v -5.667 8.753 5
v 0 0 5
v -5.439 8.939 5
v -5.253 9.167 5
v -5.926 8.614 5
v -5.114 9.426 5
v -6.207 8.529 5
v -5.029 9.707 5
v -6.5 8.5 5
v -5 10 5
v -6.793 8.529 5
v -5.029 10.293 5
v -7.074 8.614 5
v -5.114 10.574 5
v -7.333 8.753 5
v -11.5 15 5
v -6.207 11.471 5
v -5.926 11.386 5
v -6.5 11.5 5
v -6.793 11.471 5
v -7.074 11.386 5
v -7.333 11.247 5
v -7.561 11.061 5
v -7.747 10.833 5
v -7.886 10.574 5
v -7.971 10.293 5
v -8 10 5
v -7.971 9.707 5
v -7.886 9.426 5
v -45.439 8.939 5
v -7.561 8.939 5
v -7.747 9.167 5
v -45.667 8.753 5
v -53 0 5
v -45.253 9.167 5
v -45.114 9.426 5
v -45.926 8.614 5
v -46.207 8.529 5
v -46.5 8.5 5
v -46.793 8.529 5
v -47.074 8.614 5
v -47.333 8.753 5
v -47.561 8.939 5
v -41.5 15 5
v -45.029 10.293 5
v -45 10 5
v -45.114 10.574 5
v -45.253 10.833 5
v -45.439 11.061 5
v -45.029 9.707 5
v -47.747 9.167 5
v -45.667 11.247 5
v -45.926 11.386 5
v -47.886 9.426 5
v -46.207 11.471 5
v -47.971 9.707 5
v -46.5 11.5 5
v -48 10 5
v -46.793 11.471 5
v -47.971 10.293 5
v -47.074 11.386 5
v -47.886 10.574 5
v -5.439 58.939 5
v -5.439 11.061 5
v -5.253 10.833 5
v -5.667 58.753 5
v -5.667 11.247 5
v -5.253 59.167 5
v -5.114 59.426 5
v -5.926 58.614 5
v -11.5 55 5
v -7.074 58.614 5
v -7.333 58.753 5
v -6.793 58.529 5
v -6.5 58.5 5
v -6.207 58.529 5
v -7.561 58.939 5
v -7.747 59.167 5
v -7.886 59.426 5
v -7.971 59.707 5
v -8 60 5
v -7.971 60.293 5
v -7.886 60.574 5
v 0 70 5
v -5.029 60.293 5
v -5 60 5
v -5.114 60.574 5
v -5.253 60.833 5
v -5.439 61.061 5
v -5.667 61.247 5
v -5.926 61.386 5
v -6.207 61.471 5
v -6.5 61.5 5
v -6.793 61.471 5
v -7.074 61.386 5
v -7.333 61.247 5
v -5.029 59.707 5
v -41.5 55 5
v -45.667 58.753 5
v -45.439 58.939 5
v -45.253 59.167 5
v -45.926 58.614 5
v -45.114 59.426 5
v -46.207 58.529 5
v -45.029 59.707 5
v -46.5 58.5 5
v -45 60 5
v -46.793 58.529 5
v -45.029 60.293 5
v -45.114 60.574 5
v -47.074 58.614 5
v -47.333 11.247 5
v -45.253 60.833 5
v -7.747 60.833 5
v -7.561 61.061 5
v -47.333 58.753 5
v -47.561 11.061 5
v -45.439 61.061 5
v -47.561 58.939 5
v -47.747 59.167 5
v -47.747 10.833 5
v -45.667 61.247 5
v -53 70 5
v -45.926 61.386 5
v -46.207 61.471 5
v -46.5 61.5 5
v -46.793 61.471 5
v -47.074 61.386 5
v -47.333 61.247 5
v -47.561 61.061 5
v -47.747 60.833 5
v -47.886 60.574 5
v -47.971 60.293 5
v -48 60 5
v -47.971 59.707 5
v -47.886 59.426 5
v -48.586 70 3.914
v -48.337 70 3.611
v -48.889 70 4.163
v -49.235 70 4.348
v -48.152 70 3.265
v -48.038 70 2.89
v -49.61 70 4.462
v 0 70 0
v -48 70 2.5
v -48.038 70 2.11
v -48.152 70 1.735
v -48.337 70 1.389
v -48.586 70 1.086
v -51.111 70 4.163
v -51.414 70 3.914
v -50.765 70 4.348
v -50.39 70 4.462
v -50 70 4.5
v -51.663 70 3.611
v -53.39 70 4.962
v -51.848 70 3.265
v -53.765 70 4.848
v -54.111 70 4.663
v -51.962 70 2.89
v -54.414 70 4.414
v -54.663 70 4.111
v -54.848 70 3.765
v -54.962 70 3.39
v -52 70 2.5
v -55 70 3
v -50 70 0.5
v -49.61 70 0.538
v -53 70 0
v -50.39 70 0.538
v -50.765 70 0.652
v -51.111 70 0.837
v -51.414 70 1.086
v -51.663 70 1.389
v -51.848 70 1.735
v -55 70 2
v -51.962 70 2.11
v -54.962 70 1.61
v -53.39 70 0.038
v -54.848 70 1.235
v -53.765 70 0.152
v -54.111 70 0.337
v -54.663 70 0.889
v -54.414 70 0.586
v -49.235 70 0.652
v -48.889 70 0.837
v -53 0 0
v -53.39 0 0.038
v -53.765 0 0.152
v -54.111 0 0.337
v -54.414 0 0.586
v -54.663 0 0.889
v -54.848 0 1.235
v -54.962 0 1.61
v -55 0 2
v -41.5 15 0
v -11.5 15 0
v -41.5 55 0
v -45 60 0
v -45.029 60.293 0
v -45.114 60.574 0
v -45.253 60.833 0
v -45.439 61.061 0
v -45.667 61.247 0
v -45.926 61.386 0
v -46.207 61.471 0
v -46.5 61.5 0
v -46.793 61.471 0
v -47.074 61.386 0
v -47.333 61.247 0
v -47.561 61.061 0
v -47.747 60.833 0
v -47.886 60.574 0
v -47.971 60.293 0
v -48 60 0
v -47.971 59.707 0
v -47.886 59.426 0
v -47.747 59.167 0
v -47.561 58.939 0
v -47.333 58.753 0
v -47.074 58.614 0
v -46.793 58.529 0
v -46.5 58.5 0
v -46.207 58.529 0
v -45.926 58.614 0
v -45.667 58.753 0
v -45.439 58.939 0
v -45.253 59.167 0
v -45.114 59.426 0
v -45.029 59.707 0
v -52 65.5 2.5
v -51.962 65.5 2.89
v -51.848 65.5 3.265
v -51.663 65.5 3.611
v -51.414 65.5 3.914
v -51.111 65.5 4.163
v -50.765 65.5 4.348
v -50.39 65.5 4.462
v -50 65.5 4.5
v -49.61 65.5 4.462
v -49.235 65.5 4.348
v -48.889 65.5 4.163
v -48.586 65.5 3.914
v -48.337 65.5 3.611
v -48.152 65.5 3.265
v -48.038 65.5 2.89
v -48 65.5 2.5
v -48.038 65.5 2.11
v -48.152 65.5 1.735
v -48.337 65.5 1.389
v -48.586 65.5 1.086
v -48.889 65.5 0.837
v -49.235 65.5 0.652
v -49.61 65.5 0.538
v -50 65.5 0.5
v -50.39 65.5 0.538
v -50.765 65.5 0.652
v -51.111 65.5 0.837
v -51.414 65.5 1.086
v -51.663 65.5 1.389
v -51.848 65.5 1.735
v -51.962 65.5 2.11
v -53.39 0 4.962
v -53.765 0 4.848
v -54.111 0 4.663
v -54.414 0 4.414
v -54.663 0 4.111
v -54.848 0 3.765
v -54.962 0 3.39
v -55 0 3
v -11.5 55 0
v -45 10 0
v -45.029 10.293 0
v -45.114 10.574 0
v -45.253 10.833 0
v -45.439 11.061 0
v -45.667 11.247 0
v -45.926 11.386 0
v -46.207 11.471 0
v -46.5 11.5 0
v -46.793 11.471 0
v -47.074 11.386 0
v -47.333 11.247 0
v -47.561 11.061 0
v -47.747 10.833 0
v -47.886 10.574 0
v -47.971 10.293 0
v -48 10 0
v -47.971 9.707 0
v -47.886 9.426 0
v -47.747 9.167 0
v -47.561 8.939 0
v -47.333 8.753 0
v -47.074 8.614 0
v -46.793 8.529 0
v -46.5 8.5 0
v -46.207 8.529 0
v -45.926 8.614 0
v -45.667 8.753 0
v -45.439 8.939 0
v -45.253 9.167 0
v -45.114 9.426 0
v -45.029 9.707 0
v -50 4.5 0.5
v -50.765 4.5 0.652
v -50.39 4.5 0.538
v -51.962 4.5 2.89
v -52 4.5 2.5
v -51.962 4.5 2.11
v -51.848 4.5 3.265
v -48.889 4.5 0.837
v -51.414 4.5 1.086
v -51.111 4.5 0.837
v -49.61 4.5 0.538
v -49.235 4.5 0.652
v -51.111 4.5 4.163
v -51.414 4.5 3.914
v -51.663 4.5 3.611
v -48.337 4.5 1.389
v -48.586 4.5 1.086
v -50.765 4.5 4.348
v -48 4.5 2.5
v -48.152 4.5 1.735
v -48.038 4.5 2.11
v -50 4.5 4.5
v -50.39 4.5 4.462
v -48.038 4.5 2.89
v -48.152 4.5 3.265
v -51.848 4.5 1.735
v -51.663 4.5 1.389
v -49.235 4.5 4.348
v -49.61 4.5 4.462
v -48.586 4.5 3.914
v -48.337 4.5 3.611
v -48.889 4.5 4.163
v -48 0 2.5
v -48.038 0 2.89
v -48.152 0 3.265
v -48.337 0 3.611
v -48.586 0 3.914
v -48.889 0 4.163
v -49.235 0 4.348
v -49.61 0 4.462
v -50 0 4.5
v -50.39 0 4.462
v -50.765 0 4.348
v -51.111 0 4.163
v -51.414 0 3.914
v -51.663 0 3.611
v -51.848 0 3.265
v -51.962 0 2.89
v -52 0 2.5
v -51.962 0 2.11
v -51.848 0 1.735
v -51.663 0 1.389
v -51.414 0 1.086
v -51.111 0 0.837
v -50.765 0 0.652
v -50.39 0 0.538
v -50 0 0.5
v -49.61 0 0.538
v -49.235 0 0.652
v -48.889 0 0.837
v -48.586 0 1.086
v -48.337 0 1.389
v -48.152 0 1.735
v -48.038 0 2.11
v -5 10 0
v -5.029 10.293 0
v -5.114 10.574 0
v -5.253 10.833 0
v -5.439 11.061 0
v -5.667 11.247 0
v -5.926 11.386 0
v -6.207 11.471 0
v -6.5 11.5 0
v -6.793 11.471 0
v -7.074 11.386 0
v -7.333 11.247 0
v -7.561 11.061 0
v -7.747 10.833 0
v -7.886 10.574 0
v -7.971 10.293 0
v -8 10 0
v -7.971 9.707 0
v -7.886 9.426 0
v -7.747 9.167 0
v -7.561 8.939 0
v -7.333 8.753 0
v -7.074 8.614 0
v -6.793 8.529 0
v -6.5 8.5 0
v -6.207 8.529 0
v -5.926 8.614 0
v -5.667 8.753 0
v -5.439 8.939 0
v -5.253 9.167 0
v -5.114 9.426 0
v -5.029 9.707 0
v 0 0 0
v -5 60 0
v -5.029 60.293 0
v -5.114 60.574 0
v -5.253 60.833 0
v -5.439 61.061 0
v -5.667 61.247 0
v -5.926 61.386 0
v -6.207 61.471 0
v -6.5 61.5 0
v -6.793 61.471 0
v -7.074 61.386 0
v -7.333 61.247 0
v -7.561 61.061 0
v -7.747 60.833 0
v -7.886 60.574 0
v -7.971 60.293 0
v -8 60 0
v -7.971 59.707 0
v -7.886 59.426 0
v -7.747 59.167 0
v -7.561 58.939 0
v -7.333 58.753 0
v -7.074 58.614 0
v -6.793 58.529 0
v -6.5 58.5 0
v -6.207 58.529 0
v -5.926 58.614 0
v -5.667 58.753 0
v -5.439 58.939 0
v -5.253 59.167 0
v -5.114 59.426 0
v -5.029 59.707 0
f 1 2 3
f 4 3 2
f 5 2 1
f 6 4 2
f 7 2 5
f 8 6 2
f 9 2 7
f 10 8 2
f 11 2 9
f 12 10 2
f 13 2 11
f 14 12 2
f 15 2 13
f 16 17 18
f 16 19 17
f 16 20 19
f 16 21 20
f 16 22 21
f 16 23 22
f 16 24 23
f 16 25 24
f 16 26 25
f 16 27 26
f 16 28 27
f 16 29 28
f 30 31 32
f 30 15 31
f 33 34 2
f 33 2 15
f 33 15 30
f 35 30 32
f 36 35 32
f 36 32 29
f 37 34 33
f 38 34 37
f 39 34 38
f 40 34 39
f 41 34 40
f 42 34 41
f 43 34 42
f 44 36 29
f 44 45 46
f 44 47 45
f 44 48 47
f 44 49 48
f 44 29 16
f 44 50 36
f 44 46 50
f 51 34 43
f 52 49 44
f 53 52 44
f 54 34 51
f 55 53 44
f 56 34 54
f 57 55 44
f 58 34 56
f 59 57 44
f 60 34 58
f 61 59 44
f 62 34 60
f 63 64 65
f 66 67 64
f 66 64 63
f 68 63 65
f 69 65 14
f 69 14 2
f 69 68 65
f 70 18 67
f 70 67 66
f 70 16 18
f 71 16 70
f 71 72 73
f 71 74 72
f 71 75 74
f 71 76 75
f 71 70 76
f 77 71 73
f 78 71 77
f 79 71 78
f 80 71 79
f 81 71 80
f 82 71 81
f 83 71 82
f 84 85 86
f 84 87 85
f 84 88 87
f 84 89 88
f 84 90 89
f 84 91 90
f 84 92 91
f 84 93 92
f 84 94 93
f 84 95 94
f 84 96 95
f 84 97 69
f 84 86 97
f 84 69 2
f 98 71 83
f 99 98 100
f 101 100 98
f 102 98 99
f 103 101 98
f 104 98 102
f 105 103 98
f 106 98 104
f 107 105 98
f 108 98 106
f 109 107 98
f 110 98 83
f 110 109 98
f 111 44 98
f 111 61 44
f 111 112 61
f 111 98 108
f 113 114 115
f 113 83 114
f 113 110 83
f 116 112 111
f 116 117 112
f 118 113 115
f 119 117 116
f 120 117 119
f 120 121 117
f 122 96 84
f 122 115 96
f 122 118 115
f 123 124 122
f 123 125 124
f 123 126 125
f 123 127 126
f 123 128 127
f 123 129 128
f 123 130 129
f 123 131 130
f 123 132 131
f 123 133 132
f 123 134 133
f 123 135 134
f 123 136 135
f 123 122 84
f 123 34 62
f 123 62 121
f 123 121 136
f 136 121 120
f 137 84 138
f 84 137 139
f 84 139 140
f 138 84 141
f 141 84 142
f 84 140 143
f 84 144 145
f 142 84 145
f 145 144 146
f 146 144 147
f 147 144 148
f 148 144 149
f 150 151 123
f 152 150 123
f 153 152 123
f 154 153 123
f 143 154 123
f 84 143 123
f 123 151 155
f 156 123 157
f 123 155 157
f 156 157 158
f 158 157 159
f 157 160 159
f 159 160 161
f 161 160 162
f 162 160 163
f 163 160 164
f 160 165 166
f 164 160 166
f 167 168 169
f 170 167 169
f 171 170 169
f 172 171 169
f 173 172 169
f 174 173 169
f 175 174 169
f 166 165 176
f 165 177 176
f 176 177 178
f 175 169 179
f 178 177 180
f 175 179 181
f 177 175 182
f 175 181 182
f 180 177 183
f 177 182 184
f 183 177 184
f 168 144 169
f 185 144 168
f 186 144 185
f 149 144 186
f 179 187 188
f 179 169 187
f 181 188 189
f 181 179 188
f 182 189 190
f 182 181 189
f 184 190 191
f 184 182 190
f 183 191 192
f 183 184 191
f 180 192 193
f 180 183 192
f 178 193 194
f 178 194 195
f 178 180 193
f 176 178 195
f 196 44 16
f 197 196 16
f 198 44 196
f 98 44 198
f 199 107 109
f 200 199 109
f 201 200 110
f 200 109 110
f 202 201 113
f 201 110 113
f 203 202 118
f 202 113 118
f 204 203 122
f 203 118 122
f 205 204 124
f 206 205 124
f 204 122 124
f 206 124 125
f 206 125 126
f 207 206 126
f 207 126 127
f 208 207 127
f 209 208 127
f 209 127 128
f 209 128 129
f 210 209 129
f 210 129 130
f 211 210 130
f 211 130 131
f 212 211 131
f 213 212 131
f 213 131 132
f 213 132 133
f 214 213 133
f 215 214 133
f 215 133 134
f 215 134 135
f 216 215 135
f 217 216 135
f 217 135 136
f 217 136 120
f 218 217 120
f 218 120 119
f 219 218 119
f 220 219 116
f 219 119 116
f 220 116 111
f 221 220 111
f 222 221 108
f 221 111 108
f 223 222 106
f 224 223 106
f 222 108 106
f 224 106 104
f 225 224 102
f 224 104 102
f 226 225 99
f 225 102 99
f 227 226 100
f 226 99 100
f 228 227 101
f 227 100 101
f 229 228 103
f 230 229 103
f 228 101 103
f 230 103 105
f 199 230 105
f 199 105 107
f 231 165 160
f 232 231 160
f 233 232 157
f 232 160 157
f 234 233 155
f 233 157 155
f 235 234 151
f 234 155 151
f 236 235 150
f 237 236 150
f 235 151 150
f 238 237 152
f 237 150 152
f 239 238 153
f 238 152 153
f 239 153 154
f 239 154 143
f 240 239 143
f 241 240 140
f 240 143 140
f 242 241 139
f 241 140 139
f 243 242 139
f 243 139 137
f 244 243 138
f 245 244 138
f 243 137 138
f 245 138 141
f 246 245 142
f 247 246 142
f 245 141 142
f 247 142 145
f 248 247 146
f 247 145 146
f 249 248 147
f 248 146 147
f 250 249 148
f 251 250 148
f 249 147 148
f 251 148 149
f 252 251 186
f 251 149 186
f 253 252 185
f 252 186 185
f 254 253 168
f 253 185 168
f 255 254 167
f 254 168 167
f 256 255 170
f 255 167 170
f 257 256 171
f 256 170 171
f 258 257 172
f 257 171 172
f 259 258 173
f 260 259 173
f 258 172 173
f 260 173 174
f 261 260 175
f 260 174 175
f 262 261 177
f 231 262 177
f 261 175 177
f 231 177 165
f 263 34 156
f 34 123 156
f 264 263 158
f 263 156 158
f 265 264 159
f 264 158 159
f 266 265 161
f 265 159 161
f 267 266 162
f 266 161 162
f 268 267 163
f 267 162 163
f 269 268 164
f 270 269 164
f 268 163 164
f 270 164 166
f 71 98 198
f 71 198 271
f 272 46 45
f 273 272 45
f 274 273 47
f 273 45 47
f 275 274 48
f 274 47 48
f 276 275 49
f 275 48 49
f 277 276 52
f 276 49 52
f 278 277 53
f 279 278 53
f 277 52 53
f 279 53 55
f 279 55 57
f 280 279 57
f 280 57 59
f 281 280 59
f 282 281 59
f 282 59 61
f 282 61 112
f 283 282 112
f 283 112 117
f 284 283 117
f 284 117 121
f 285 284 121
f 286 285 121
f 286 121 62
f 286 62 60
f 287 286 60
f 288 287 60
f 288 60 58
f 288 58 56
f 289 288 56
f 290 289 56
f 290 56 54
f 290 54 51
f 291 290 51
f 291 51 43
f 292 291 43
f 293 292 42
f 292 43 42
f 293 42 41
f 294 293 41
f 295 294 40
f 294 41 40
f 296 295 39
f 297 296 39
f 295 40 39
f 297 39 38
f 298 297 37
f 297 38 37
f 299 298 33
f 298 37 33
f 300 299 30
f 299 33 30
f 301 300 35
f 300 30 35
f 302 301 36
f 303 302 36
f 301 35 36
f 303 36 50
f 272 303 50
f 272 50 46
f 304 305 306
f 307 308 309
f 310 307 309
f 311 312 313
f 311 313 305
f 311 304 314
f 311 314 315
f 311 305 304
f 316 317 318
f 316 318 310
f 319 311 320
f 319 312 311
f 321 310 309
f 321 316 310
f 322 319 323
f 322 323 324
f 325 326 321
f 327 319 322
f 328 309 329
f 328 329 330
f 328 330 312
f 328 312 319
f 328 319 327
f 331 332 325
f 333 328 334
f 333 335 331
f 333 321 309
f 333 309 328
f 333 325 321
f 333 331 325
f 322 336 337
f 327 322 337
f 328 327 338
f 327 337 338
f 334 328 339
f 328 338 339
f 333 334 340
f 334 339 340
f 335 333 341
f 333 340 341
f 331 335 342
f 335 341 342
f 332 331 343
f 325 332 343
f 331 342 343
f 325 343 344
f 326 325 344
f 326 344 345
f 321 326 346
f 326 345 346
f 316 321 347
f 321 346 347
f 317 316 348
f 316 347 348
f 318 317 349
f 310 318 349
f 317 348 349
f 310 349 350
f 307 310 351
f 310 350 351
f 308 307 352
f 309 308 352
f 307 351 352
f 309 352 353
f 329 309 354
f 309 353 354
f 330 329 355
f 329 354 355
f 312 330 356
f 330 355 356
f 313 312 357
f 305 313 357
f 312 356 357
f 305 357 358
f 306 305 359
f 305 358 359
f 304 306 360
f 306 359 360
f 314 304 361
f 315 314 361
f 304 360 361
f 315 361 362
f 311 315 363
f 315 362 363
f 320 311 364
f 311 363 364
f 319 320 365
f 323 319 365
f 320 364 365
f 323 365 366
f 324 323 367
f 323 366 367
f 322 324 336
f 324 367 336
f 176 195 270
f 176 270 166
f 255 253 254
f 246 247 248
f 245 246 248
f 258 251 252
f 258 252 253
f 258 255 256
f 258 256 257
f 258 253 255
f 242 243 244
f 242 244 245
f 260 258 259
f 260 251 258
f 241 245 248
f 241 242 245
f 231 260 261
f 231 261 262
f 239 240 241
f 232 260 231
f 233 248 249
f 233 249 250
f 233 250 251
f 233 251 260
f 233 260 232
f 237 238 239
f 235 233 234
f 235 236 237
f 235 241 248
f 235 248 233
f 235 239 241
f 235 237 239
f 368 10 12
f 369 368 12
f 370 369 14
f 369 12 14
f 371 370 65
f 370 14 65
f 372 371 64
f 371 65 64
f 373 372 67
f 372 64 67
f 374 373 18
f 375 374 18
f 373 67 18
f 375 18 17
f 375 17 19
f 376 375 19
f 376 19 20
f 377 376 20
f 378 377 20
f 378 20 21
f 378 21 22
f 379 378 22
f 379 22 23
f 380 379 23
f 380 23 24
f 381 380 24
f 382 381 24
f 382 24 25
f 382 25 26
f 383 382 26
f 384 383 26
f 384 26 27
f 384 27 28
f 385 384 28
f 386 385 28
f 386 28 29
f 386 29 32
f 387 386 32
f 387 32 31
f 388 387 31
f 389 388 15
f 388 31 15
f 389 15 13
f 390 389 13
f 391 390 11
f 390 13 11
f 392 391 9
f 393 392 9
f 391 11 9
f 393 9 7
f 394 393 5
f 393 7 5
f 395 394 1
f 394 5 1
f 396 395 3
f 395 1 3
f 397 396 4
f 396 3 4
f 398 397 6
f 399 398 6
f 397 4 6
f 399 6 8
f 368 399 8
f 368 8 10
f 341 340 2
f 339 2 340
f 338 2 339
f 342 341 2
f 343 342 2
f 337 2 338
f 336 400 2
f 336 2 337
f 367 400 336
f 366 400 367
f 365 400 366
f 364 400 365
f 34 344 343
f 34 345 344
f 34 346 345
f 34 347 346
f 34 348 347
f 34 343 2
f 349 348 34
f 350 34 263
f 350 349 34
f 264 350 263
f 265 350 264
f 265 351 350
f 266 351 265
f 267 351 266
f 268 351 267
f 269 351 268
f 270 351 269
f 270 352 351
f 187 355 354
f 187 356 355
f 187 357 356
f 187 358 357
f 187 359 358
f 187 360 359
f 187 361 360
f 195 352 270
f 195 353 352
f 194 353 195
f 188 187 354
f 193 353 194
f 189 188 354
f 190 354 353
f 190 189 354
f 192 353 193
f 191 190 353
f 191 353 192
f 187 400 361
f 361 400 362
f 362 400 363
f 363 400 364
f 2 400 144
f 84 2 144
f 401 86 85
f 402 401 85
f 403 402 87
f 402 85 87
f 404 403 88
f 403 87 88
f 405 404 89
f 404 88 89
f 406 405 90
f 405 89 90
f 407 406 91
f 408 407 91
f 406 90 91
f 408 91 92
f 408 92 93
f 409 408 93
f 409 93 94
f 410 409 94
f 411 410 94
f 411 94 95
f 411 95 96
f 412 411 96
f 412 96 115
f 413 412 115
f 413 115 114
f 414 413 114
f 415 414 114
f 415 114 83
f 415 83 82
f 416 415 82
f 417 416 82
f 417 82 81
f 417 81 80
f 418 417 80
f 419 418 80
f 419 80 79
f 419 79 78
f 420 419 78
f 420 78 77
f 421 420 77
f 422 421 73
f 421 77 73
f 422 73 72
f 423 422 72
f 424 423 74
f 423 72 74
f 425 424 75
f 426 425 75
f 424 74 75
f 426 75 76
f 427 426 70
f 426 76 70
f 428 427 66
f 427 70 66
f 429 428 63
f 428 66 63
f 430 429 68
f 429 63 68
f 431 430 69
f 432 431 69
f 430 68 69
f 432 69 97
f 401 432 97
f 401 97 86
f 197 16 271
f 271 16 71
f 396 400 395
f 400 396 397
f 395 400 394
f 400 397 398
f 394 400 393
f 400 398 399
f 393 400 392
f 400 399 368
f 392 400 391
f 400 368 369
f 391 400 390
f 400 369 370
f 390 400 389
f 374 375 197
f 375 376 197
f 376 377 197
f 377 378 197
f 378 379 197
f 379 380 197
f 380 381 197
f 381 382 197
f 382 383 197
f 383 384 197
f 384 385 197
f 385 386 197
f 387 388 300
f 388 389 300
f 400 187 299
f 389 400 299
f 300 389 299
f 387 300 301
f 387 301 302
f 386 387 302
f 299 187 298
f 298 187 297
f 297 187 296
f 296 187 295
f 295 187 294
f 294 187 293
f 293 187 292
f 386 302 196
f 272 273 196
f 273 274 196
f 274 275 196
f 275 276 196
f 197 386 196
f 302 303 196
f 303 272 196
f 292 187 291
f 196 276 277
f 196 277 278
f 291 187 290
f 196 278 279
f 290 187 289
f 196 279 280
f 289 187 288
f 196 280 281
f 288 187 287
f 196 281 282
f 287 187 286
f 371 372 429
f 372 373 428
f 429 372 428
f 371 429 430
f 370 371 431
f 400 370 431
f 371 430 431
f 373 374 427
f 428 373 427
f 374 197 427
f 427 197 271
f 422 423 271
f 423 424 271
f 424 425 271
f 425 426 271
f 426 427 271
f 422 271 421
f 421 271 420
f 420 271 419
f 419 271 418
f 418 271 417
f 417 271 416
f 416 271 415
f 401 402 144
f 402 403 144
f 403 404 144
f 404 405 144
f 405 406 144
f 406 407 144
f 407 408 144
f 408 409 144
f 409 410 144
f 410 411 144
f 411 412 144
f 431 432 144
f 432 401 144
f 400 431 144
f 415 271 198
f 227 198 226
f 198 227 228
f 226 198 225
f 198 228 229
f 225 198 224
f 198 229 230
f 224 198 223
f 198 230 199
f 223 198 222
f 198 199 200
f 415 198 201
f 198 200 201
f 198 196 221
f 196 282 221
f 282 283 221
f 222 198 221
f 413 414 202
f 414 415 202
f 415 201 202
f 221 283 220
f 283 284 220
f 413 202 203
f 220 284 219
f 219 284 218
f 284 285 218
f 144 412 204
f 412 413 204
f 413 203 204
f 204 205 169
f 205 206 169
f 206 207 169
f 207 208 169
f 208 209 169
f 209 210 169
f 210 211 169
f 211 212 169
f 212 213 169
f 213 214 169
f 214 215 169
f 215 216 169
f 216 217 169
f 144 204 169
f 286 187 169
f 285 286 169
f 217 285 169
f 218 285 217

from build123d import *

# Parameters (mm, degrees)
SKETCH1_W           = 70
SKETCH1_H           = 55
BOSS_EXTRUDE1_DEPTH = 5
SKETCH2_R           = 2
CUT_EXTRUDE1_DEPTH  = 4.5
SKETCH3_R           = 2
CUT_EXTRUDE2_DEPTH  = 4.5
FILLET1_R           = 2
SKETCH4_R           = 1.5
SKETCH4_W           = 30
SKETCH4_H           = 40
CUT_EXTRUDE3_DEPTH  = 6


with BuildPart() as part:
    # Sketch1 → Boss-Extrude1 (new body)
    with BuildSketch(Plane(origin=(0, 0, 0), x_dir=(0, 1, 0), z_dir=(0, 0, 1))):
        with Locations((35, 27.5)):
            Rectangle(SKETCH1_W, SKETCH1_H)
    extrude(amount=BOSS_EXTRUDE1_DEPTH)

    # Sketch2 → Cut-Extrude1 (cut)
    with BuildSketch(Plane(origin=(0, 70, 0), x_dir=(-1, 0, 0), z_dir=(0, 1, 0))):
        with Locations((50, 2.5)):
            Circle(SKETCH2_R)
    extrude(amount=-CUT_EXTRUDE1_DEPTH, mode=Mode.SUBTRACT)

    # Sketch3 → Cut-Extrude2 (cut)
    with BuildSketch(Plane.XZ):
        with Locations((-50, 2.5)):
            Circle(SKETCH3_R)
    extrude(amount=-CUT_EXTRUDE2_DEPTH, mode=Mode.SUBTRACT)

    # Fillet1
    fillet1_edges = [part.edges().sort_by_distance(p)[0] for p in [
        (-55, 35, 5),
        (-55, 35, 0),
    ]]
    fillet(fillet1_edges, radius=FILLET1_R)

    # Sketch4 → Cut-Extrude3 (cut, through all)
    with BuildSketch(Plane.XY.offset(5)):
        with Locations((-6.5, 60)):
            Circle(SKETCH4_R)
        with Locations((-46.5, 60)):
            Circle(SKETCH4_R)
        with Locations((-6.5, 10)):
            Circle(SKETCH4_R)
        with Locations((-46.5, 10)):
            Circle(SKETCH4_R)
        with Locations((-26.5, 35)):
            Rectangle(SKETCH4_W, SKETCH4_H)
    extrude(amount=-CUT_EXTRUDE3_DEPTH, mode=Mode.SUBTRACT)


solid = part.part
